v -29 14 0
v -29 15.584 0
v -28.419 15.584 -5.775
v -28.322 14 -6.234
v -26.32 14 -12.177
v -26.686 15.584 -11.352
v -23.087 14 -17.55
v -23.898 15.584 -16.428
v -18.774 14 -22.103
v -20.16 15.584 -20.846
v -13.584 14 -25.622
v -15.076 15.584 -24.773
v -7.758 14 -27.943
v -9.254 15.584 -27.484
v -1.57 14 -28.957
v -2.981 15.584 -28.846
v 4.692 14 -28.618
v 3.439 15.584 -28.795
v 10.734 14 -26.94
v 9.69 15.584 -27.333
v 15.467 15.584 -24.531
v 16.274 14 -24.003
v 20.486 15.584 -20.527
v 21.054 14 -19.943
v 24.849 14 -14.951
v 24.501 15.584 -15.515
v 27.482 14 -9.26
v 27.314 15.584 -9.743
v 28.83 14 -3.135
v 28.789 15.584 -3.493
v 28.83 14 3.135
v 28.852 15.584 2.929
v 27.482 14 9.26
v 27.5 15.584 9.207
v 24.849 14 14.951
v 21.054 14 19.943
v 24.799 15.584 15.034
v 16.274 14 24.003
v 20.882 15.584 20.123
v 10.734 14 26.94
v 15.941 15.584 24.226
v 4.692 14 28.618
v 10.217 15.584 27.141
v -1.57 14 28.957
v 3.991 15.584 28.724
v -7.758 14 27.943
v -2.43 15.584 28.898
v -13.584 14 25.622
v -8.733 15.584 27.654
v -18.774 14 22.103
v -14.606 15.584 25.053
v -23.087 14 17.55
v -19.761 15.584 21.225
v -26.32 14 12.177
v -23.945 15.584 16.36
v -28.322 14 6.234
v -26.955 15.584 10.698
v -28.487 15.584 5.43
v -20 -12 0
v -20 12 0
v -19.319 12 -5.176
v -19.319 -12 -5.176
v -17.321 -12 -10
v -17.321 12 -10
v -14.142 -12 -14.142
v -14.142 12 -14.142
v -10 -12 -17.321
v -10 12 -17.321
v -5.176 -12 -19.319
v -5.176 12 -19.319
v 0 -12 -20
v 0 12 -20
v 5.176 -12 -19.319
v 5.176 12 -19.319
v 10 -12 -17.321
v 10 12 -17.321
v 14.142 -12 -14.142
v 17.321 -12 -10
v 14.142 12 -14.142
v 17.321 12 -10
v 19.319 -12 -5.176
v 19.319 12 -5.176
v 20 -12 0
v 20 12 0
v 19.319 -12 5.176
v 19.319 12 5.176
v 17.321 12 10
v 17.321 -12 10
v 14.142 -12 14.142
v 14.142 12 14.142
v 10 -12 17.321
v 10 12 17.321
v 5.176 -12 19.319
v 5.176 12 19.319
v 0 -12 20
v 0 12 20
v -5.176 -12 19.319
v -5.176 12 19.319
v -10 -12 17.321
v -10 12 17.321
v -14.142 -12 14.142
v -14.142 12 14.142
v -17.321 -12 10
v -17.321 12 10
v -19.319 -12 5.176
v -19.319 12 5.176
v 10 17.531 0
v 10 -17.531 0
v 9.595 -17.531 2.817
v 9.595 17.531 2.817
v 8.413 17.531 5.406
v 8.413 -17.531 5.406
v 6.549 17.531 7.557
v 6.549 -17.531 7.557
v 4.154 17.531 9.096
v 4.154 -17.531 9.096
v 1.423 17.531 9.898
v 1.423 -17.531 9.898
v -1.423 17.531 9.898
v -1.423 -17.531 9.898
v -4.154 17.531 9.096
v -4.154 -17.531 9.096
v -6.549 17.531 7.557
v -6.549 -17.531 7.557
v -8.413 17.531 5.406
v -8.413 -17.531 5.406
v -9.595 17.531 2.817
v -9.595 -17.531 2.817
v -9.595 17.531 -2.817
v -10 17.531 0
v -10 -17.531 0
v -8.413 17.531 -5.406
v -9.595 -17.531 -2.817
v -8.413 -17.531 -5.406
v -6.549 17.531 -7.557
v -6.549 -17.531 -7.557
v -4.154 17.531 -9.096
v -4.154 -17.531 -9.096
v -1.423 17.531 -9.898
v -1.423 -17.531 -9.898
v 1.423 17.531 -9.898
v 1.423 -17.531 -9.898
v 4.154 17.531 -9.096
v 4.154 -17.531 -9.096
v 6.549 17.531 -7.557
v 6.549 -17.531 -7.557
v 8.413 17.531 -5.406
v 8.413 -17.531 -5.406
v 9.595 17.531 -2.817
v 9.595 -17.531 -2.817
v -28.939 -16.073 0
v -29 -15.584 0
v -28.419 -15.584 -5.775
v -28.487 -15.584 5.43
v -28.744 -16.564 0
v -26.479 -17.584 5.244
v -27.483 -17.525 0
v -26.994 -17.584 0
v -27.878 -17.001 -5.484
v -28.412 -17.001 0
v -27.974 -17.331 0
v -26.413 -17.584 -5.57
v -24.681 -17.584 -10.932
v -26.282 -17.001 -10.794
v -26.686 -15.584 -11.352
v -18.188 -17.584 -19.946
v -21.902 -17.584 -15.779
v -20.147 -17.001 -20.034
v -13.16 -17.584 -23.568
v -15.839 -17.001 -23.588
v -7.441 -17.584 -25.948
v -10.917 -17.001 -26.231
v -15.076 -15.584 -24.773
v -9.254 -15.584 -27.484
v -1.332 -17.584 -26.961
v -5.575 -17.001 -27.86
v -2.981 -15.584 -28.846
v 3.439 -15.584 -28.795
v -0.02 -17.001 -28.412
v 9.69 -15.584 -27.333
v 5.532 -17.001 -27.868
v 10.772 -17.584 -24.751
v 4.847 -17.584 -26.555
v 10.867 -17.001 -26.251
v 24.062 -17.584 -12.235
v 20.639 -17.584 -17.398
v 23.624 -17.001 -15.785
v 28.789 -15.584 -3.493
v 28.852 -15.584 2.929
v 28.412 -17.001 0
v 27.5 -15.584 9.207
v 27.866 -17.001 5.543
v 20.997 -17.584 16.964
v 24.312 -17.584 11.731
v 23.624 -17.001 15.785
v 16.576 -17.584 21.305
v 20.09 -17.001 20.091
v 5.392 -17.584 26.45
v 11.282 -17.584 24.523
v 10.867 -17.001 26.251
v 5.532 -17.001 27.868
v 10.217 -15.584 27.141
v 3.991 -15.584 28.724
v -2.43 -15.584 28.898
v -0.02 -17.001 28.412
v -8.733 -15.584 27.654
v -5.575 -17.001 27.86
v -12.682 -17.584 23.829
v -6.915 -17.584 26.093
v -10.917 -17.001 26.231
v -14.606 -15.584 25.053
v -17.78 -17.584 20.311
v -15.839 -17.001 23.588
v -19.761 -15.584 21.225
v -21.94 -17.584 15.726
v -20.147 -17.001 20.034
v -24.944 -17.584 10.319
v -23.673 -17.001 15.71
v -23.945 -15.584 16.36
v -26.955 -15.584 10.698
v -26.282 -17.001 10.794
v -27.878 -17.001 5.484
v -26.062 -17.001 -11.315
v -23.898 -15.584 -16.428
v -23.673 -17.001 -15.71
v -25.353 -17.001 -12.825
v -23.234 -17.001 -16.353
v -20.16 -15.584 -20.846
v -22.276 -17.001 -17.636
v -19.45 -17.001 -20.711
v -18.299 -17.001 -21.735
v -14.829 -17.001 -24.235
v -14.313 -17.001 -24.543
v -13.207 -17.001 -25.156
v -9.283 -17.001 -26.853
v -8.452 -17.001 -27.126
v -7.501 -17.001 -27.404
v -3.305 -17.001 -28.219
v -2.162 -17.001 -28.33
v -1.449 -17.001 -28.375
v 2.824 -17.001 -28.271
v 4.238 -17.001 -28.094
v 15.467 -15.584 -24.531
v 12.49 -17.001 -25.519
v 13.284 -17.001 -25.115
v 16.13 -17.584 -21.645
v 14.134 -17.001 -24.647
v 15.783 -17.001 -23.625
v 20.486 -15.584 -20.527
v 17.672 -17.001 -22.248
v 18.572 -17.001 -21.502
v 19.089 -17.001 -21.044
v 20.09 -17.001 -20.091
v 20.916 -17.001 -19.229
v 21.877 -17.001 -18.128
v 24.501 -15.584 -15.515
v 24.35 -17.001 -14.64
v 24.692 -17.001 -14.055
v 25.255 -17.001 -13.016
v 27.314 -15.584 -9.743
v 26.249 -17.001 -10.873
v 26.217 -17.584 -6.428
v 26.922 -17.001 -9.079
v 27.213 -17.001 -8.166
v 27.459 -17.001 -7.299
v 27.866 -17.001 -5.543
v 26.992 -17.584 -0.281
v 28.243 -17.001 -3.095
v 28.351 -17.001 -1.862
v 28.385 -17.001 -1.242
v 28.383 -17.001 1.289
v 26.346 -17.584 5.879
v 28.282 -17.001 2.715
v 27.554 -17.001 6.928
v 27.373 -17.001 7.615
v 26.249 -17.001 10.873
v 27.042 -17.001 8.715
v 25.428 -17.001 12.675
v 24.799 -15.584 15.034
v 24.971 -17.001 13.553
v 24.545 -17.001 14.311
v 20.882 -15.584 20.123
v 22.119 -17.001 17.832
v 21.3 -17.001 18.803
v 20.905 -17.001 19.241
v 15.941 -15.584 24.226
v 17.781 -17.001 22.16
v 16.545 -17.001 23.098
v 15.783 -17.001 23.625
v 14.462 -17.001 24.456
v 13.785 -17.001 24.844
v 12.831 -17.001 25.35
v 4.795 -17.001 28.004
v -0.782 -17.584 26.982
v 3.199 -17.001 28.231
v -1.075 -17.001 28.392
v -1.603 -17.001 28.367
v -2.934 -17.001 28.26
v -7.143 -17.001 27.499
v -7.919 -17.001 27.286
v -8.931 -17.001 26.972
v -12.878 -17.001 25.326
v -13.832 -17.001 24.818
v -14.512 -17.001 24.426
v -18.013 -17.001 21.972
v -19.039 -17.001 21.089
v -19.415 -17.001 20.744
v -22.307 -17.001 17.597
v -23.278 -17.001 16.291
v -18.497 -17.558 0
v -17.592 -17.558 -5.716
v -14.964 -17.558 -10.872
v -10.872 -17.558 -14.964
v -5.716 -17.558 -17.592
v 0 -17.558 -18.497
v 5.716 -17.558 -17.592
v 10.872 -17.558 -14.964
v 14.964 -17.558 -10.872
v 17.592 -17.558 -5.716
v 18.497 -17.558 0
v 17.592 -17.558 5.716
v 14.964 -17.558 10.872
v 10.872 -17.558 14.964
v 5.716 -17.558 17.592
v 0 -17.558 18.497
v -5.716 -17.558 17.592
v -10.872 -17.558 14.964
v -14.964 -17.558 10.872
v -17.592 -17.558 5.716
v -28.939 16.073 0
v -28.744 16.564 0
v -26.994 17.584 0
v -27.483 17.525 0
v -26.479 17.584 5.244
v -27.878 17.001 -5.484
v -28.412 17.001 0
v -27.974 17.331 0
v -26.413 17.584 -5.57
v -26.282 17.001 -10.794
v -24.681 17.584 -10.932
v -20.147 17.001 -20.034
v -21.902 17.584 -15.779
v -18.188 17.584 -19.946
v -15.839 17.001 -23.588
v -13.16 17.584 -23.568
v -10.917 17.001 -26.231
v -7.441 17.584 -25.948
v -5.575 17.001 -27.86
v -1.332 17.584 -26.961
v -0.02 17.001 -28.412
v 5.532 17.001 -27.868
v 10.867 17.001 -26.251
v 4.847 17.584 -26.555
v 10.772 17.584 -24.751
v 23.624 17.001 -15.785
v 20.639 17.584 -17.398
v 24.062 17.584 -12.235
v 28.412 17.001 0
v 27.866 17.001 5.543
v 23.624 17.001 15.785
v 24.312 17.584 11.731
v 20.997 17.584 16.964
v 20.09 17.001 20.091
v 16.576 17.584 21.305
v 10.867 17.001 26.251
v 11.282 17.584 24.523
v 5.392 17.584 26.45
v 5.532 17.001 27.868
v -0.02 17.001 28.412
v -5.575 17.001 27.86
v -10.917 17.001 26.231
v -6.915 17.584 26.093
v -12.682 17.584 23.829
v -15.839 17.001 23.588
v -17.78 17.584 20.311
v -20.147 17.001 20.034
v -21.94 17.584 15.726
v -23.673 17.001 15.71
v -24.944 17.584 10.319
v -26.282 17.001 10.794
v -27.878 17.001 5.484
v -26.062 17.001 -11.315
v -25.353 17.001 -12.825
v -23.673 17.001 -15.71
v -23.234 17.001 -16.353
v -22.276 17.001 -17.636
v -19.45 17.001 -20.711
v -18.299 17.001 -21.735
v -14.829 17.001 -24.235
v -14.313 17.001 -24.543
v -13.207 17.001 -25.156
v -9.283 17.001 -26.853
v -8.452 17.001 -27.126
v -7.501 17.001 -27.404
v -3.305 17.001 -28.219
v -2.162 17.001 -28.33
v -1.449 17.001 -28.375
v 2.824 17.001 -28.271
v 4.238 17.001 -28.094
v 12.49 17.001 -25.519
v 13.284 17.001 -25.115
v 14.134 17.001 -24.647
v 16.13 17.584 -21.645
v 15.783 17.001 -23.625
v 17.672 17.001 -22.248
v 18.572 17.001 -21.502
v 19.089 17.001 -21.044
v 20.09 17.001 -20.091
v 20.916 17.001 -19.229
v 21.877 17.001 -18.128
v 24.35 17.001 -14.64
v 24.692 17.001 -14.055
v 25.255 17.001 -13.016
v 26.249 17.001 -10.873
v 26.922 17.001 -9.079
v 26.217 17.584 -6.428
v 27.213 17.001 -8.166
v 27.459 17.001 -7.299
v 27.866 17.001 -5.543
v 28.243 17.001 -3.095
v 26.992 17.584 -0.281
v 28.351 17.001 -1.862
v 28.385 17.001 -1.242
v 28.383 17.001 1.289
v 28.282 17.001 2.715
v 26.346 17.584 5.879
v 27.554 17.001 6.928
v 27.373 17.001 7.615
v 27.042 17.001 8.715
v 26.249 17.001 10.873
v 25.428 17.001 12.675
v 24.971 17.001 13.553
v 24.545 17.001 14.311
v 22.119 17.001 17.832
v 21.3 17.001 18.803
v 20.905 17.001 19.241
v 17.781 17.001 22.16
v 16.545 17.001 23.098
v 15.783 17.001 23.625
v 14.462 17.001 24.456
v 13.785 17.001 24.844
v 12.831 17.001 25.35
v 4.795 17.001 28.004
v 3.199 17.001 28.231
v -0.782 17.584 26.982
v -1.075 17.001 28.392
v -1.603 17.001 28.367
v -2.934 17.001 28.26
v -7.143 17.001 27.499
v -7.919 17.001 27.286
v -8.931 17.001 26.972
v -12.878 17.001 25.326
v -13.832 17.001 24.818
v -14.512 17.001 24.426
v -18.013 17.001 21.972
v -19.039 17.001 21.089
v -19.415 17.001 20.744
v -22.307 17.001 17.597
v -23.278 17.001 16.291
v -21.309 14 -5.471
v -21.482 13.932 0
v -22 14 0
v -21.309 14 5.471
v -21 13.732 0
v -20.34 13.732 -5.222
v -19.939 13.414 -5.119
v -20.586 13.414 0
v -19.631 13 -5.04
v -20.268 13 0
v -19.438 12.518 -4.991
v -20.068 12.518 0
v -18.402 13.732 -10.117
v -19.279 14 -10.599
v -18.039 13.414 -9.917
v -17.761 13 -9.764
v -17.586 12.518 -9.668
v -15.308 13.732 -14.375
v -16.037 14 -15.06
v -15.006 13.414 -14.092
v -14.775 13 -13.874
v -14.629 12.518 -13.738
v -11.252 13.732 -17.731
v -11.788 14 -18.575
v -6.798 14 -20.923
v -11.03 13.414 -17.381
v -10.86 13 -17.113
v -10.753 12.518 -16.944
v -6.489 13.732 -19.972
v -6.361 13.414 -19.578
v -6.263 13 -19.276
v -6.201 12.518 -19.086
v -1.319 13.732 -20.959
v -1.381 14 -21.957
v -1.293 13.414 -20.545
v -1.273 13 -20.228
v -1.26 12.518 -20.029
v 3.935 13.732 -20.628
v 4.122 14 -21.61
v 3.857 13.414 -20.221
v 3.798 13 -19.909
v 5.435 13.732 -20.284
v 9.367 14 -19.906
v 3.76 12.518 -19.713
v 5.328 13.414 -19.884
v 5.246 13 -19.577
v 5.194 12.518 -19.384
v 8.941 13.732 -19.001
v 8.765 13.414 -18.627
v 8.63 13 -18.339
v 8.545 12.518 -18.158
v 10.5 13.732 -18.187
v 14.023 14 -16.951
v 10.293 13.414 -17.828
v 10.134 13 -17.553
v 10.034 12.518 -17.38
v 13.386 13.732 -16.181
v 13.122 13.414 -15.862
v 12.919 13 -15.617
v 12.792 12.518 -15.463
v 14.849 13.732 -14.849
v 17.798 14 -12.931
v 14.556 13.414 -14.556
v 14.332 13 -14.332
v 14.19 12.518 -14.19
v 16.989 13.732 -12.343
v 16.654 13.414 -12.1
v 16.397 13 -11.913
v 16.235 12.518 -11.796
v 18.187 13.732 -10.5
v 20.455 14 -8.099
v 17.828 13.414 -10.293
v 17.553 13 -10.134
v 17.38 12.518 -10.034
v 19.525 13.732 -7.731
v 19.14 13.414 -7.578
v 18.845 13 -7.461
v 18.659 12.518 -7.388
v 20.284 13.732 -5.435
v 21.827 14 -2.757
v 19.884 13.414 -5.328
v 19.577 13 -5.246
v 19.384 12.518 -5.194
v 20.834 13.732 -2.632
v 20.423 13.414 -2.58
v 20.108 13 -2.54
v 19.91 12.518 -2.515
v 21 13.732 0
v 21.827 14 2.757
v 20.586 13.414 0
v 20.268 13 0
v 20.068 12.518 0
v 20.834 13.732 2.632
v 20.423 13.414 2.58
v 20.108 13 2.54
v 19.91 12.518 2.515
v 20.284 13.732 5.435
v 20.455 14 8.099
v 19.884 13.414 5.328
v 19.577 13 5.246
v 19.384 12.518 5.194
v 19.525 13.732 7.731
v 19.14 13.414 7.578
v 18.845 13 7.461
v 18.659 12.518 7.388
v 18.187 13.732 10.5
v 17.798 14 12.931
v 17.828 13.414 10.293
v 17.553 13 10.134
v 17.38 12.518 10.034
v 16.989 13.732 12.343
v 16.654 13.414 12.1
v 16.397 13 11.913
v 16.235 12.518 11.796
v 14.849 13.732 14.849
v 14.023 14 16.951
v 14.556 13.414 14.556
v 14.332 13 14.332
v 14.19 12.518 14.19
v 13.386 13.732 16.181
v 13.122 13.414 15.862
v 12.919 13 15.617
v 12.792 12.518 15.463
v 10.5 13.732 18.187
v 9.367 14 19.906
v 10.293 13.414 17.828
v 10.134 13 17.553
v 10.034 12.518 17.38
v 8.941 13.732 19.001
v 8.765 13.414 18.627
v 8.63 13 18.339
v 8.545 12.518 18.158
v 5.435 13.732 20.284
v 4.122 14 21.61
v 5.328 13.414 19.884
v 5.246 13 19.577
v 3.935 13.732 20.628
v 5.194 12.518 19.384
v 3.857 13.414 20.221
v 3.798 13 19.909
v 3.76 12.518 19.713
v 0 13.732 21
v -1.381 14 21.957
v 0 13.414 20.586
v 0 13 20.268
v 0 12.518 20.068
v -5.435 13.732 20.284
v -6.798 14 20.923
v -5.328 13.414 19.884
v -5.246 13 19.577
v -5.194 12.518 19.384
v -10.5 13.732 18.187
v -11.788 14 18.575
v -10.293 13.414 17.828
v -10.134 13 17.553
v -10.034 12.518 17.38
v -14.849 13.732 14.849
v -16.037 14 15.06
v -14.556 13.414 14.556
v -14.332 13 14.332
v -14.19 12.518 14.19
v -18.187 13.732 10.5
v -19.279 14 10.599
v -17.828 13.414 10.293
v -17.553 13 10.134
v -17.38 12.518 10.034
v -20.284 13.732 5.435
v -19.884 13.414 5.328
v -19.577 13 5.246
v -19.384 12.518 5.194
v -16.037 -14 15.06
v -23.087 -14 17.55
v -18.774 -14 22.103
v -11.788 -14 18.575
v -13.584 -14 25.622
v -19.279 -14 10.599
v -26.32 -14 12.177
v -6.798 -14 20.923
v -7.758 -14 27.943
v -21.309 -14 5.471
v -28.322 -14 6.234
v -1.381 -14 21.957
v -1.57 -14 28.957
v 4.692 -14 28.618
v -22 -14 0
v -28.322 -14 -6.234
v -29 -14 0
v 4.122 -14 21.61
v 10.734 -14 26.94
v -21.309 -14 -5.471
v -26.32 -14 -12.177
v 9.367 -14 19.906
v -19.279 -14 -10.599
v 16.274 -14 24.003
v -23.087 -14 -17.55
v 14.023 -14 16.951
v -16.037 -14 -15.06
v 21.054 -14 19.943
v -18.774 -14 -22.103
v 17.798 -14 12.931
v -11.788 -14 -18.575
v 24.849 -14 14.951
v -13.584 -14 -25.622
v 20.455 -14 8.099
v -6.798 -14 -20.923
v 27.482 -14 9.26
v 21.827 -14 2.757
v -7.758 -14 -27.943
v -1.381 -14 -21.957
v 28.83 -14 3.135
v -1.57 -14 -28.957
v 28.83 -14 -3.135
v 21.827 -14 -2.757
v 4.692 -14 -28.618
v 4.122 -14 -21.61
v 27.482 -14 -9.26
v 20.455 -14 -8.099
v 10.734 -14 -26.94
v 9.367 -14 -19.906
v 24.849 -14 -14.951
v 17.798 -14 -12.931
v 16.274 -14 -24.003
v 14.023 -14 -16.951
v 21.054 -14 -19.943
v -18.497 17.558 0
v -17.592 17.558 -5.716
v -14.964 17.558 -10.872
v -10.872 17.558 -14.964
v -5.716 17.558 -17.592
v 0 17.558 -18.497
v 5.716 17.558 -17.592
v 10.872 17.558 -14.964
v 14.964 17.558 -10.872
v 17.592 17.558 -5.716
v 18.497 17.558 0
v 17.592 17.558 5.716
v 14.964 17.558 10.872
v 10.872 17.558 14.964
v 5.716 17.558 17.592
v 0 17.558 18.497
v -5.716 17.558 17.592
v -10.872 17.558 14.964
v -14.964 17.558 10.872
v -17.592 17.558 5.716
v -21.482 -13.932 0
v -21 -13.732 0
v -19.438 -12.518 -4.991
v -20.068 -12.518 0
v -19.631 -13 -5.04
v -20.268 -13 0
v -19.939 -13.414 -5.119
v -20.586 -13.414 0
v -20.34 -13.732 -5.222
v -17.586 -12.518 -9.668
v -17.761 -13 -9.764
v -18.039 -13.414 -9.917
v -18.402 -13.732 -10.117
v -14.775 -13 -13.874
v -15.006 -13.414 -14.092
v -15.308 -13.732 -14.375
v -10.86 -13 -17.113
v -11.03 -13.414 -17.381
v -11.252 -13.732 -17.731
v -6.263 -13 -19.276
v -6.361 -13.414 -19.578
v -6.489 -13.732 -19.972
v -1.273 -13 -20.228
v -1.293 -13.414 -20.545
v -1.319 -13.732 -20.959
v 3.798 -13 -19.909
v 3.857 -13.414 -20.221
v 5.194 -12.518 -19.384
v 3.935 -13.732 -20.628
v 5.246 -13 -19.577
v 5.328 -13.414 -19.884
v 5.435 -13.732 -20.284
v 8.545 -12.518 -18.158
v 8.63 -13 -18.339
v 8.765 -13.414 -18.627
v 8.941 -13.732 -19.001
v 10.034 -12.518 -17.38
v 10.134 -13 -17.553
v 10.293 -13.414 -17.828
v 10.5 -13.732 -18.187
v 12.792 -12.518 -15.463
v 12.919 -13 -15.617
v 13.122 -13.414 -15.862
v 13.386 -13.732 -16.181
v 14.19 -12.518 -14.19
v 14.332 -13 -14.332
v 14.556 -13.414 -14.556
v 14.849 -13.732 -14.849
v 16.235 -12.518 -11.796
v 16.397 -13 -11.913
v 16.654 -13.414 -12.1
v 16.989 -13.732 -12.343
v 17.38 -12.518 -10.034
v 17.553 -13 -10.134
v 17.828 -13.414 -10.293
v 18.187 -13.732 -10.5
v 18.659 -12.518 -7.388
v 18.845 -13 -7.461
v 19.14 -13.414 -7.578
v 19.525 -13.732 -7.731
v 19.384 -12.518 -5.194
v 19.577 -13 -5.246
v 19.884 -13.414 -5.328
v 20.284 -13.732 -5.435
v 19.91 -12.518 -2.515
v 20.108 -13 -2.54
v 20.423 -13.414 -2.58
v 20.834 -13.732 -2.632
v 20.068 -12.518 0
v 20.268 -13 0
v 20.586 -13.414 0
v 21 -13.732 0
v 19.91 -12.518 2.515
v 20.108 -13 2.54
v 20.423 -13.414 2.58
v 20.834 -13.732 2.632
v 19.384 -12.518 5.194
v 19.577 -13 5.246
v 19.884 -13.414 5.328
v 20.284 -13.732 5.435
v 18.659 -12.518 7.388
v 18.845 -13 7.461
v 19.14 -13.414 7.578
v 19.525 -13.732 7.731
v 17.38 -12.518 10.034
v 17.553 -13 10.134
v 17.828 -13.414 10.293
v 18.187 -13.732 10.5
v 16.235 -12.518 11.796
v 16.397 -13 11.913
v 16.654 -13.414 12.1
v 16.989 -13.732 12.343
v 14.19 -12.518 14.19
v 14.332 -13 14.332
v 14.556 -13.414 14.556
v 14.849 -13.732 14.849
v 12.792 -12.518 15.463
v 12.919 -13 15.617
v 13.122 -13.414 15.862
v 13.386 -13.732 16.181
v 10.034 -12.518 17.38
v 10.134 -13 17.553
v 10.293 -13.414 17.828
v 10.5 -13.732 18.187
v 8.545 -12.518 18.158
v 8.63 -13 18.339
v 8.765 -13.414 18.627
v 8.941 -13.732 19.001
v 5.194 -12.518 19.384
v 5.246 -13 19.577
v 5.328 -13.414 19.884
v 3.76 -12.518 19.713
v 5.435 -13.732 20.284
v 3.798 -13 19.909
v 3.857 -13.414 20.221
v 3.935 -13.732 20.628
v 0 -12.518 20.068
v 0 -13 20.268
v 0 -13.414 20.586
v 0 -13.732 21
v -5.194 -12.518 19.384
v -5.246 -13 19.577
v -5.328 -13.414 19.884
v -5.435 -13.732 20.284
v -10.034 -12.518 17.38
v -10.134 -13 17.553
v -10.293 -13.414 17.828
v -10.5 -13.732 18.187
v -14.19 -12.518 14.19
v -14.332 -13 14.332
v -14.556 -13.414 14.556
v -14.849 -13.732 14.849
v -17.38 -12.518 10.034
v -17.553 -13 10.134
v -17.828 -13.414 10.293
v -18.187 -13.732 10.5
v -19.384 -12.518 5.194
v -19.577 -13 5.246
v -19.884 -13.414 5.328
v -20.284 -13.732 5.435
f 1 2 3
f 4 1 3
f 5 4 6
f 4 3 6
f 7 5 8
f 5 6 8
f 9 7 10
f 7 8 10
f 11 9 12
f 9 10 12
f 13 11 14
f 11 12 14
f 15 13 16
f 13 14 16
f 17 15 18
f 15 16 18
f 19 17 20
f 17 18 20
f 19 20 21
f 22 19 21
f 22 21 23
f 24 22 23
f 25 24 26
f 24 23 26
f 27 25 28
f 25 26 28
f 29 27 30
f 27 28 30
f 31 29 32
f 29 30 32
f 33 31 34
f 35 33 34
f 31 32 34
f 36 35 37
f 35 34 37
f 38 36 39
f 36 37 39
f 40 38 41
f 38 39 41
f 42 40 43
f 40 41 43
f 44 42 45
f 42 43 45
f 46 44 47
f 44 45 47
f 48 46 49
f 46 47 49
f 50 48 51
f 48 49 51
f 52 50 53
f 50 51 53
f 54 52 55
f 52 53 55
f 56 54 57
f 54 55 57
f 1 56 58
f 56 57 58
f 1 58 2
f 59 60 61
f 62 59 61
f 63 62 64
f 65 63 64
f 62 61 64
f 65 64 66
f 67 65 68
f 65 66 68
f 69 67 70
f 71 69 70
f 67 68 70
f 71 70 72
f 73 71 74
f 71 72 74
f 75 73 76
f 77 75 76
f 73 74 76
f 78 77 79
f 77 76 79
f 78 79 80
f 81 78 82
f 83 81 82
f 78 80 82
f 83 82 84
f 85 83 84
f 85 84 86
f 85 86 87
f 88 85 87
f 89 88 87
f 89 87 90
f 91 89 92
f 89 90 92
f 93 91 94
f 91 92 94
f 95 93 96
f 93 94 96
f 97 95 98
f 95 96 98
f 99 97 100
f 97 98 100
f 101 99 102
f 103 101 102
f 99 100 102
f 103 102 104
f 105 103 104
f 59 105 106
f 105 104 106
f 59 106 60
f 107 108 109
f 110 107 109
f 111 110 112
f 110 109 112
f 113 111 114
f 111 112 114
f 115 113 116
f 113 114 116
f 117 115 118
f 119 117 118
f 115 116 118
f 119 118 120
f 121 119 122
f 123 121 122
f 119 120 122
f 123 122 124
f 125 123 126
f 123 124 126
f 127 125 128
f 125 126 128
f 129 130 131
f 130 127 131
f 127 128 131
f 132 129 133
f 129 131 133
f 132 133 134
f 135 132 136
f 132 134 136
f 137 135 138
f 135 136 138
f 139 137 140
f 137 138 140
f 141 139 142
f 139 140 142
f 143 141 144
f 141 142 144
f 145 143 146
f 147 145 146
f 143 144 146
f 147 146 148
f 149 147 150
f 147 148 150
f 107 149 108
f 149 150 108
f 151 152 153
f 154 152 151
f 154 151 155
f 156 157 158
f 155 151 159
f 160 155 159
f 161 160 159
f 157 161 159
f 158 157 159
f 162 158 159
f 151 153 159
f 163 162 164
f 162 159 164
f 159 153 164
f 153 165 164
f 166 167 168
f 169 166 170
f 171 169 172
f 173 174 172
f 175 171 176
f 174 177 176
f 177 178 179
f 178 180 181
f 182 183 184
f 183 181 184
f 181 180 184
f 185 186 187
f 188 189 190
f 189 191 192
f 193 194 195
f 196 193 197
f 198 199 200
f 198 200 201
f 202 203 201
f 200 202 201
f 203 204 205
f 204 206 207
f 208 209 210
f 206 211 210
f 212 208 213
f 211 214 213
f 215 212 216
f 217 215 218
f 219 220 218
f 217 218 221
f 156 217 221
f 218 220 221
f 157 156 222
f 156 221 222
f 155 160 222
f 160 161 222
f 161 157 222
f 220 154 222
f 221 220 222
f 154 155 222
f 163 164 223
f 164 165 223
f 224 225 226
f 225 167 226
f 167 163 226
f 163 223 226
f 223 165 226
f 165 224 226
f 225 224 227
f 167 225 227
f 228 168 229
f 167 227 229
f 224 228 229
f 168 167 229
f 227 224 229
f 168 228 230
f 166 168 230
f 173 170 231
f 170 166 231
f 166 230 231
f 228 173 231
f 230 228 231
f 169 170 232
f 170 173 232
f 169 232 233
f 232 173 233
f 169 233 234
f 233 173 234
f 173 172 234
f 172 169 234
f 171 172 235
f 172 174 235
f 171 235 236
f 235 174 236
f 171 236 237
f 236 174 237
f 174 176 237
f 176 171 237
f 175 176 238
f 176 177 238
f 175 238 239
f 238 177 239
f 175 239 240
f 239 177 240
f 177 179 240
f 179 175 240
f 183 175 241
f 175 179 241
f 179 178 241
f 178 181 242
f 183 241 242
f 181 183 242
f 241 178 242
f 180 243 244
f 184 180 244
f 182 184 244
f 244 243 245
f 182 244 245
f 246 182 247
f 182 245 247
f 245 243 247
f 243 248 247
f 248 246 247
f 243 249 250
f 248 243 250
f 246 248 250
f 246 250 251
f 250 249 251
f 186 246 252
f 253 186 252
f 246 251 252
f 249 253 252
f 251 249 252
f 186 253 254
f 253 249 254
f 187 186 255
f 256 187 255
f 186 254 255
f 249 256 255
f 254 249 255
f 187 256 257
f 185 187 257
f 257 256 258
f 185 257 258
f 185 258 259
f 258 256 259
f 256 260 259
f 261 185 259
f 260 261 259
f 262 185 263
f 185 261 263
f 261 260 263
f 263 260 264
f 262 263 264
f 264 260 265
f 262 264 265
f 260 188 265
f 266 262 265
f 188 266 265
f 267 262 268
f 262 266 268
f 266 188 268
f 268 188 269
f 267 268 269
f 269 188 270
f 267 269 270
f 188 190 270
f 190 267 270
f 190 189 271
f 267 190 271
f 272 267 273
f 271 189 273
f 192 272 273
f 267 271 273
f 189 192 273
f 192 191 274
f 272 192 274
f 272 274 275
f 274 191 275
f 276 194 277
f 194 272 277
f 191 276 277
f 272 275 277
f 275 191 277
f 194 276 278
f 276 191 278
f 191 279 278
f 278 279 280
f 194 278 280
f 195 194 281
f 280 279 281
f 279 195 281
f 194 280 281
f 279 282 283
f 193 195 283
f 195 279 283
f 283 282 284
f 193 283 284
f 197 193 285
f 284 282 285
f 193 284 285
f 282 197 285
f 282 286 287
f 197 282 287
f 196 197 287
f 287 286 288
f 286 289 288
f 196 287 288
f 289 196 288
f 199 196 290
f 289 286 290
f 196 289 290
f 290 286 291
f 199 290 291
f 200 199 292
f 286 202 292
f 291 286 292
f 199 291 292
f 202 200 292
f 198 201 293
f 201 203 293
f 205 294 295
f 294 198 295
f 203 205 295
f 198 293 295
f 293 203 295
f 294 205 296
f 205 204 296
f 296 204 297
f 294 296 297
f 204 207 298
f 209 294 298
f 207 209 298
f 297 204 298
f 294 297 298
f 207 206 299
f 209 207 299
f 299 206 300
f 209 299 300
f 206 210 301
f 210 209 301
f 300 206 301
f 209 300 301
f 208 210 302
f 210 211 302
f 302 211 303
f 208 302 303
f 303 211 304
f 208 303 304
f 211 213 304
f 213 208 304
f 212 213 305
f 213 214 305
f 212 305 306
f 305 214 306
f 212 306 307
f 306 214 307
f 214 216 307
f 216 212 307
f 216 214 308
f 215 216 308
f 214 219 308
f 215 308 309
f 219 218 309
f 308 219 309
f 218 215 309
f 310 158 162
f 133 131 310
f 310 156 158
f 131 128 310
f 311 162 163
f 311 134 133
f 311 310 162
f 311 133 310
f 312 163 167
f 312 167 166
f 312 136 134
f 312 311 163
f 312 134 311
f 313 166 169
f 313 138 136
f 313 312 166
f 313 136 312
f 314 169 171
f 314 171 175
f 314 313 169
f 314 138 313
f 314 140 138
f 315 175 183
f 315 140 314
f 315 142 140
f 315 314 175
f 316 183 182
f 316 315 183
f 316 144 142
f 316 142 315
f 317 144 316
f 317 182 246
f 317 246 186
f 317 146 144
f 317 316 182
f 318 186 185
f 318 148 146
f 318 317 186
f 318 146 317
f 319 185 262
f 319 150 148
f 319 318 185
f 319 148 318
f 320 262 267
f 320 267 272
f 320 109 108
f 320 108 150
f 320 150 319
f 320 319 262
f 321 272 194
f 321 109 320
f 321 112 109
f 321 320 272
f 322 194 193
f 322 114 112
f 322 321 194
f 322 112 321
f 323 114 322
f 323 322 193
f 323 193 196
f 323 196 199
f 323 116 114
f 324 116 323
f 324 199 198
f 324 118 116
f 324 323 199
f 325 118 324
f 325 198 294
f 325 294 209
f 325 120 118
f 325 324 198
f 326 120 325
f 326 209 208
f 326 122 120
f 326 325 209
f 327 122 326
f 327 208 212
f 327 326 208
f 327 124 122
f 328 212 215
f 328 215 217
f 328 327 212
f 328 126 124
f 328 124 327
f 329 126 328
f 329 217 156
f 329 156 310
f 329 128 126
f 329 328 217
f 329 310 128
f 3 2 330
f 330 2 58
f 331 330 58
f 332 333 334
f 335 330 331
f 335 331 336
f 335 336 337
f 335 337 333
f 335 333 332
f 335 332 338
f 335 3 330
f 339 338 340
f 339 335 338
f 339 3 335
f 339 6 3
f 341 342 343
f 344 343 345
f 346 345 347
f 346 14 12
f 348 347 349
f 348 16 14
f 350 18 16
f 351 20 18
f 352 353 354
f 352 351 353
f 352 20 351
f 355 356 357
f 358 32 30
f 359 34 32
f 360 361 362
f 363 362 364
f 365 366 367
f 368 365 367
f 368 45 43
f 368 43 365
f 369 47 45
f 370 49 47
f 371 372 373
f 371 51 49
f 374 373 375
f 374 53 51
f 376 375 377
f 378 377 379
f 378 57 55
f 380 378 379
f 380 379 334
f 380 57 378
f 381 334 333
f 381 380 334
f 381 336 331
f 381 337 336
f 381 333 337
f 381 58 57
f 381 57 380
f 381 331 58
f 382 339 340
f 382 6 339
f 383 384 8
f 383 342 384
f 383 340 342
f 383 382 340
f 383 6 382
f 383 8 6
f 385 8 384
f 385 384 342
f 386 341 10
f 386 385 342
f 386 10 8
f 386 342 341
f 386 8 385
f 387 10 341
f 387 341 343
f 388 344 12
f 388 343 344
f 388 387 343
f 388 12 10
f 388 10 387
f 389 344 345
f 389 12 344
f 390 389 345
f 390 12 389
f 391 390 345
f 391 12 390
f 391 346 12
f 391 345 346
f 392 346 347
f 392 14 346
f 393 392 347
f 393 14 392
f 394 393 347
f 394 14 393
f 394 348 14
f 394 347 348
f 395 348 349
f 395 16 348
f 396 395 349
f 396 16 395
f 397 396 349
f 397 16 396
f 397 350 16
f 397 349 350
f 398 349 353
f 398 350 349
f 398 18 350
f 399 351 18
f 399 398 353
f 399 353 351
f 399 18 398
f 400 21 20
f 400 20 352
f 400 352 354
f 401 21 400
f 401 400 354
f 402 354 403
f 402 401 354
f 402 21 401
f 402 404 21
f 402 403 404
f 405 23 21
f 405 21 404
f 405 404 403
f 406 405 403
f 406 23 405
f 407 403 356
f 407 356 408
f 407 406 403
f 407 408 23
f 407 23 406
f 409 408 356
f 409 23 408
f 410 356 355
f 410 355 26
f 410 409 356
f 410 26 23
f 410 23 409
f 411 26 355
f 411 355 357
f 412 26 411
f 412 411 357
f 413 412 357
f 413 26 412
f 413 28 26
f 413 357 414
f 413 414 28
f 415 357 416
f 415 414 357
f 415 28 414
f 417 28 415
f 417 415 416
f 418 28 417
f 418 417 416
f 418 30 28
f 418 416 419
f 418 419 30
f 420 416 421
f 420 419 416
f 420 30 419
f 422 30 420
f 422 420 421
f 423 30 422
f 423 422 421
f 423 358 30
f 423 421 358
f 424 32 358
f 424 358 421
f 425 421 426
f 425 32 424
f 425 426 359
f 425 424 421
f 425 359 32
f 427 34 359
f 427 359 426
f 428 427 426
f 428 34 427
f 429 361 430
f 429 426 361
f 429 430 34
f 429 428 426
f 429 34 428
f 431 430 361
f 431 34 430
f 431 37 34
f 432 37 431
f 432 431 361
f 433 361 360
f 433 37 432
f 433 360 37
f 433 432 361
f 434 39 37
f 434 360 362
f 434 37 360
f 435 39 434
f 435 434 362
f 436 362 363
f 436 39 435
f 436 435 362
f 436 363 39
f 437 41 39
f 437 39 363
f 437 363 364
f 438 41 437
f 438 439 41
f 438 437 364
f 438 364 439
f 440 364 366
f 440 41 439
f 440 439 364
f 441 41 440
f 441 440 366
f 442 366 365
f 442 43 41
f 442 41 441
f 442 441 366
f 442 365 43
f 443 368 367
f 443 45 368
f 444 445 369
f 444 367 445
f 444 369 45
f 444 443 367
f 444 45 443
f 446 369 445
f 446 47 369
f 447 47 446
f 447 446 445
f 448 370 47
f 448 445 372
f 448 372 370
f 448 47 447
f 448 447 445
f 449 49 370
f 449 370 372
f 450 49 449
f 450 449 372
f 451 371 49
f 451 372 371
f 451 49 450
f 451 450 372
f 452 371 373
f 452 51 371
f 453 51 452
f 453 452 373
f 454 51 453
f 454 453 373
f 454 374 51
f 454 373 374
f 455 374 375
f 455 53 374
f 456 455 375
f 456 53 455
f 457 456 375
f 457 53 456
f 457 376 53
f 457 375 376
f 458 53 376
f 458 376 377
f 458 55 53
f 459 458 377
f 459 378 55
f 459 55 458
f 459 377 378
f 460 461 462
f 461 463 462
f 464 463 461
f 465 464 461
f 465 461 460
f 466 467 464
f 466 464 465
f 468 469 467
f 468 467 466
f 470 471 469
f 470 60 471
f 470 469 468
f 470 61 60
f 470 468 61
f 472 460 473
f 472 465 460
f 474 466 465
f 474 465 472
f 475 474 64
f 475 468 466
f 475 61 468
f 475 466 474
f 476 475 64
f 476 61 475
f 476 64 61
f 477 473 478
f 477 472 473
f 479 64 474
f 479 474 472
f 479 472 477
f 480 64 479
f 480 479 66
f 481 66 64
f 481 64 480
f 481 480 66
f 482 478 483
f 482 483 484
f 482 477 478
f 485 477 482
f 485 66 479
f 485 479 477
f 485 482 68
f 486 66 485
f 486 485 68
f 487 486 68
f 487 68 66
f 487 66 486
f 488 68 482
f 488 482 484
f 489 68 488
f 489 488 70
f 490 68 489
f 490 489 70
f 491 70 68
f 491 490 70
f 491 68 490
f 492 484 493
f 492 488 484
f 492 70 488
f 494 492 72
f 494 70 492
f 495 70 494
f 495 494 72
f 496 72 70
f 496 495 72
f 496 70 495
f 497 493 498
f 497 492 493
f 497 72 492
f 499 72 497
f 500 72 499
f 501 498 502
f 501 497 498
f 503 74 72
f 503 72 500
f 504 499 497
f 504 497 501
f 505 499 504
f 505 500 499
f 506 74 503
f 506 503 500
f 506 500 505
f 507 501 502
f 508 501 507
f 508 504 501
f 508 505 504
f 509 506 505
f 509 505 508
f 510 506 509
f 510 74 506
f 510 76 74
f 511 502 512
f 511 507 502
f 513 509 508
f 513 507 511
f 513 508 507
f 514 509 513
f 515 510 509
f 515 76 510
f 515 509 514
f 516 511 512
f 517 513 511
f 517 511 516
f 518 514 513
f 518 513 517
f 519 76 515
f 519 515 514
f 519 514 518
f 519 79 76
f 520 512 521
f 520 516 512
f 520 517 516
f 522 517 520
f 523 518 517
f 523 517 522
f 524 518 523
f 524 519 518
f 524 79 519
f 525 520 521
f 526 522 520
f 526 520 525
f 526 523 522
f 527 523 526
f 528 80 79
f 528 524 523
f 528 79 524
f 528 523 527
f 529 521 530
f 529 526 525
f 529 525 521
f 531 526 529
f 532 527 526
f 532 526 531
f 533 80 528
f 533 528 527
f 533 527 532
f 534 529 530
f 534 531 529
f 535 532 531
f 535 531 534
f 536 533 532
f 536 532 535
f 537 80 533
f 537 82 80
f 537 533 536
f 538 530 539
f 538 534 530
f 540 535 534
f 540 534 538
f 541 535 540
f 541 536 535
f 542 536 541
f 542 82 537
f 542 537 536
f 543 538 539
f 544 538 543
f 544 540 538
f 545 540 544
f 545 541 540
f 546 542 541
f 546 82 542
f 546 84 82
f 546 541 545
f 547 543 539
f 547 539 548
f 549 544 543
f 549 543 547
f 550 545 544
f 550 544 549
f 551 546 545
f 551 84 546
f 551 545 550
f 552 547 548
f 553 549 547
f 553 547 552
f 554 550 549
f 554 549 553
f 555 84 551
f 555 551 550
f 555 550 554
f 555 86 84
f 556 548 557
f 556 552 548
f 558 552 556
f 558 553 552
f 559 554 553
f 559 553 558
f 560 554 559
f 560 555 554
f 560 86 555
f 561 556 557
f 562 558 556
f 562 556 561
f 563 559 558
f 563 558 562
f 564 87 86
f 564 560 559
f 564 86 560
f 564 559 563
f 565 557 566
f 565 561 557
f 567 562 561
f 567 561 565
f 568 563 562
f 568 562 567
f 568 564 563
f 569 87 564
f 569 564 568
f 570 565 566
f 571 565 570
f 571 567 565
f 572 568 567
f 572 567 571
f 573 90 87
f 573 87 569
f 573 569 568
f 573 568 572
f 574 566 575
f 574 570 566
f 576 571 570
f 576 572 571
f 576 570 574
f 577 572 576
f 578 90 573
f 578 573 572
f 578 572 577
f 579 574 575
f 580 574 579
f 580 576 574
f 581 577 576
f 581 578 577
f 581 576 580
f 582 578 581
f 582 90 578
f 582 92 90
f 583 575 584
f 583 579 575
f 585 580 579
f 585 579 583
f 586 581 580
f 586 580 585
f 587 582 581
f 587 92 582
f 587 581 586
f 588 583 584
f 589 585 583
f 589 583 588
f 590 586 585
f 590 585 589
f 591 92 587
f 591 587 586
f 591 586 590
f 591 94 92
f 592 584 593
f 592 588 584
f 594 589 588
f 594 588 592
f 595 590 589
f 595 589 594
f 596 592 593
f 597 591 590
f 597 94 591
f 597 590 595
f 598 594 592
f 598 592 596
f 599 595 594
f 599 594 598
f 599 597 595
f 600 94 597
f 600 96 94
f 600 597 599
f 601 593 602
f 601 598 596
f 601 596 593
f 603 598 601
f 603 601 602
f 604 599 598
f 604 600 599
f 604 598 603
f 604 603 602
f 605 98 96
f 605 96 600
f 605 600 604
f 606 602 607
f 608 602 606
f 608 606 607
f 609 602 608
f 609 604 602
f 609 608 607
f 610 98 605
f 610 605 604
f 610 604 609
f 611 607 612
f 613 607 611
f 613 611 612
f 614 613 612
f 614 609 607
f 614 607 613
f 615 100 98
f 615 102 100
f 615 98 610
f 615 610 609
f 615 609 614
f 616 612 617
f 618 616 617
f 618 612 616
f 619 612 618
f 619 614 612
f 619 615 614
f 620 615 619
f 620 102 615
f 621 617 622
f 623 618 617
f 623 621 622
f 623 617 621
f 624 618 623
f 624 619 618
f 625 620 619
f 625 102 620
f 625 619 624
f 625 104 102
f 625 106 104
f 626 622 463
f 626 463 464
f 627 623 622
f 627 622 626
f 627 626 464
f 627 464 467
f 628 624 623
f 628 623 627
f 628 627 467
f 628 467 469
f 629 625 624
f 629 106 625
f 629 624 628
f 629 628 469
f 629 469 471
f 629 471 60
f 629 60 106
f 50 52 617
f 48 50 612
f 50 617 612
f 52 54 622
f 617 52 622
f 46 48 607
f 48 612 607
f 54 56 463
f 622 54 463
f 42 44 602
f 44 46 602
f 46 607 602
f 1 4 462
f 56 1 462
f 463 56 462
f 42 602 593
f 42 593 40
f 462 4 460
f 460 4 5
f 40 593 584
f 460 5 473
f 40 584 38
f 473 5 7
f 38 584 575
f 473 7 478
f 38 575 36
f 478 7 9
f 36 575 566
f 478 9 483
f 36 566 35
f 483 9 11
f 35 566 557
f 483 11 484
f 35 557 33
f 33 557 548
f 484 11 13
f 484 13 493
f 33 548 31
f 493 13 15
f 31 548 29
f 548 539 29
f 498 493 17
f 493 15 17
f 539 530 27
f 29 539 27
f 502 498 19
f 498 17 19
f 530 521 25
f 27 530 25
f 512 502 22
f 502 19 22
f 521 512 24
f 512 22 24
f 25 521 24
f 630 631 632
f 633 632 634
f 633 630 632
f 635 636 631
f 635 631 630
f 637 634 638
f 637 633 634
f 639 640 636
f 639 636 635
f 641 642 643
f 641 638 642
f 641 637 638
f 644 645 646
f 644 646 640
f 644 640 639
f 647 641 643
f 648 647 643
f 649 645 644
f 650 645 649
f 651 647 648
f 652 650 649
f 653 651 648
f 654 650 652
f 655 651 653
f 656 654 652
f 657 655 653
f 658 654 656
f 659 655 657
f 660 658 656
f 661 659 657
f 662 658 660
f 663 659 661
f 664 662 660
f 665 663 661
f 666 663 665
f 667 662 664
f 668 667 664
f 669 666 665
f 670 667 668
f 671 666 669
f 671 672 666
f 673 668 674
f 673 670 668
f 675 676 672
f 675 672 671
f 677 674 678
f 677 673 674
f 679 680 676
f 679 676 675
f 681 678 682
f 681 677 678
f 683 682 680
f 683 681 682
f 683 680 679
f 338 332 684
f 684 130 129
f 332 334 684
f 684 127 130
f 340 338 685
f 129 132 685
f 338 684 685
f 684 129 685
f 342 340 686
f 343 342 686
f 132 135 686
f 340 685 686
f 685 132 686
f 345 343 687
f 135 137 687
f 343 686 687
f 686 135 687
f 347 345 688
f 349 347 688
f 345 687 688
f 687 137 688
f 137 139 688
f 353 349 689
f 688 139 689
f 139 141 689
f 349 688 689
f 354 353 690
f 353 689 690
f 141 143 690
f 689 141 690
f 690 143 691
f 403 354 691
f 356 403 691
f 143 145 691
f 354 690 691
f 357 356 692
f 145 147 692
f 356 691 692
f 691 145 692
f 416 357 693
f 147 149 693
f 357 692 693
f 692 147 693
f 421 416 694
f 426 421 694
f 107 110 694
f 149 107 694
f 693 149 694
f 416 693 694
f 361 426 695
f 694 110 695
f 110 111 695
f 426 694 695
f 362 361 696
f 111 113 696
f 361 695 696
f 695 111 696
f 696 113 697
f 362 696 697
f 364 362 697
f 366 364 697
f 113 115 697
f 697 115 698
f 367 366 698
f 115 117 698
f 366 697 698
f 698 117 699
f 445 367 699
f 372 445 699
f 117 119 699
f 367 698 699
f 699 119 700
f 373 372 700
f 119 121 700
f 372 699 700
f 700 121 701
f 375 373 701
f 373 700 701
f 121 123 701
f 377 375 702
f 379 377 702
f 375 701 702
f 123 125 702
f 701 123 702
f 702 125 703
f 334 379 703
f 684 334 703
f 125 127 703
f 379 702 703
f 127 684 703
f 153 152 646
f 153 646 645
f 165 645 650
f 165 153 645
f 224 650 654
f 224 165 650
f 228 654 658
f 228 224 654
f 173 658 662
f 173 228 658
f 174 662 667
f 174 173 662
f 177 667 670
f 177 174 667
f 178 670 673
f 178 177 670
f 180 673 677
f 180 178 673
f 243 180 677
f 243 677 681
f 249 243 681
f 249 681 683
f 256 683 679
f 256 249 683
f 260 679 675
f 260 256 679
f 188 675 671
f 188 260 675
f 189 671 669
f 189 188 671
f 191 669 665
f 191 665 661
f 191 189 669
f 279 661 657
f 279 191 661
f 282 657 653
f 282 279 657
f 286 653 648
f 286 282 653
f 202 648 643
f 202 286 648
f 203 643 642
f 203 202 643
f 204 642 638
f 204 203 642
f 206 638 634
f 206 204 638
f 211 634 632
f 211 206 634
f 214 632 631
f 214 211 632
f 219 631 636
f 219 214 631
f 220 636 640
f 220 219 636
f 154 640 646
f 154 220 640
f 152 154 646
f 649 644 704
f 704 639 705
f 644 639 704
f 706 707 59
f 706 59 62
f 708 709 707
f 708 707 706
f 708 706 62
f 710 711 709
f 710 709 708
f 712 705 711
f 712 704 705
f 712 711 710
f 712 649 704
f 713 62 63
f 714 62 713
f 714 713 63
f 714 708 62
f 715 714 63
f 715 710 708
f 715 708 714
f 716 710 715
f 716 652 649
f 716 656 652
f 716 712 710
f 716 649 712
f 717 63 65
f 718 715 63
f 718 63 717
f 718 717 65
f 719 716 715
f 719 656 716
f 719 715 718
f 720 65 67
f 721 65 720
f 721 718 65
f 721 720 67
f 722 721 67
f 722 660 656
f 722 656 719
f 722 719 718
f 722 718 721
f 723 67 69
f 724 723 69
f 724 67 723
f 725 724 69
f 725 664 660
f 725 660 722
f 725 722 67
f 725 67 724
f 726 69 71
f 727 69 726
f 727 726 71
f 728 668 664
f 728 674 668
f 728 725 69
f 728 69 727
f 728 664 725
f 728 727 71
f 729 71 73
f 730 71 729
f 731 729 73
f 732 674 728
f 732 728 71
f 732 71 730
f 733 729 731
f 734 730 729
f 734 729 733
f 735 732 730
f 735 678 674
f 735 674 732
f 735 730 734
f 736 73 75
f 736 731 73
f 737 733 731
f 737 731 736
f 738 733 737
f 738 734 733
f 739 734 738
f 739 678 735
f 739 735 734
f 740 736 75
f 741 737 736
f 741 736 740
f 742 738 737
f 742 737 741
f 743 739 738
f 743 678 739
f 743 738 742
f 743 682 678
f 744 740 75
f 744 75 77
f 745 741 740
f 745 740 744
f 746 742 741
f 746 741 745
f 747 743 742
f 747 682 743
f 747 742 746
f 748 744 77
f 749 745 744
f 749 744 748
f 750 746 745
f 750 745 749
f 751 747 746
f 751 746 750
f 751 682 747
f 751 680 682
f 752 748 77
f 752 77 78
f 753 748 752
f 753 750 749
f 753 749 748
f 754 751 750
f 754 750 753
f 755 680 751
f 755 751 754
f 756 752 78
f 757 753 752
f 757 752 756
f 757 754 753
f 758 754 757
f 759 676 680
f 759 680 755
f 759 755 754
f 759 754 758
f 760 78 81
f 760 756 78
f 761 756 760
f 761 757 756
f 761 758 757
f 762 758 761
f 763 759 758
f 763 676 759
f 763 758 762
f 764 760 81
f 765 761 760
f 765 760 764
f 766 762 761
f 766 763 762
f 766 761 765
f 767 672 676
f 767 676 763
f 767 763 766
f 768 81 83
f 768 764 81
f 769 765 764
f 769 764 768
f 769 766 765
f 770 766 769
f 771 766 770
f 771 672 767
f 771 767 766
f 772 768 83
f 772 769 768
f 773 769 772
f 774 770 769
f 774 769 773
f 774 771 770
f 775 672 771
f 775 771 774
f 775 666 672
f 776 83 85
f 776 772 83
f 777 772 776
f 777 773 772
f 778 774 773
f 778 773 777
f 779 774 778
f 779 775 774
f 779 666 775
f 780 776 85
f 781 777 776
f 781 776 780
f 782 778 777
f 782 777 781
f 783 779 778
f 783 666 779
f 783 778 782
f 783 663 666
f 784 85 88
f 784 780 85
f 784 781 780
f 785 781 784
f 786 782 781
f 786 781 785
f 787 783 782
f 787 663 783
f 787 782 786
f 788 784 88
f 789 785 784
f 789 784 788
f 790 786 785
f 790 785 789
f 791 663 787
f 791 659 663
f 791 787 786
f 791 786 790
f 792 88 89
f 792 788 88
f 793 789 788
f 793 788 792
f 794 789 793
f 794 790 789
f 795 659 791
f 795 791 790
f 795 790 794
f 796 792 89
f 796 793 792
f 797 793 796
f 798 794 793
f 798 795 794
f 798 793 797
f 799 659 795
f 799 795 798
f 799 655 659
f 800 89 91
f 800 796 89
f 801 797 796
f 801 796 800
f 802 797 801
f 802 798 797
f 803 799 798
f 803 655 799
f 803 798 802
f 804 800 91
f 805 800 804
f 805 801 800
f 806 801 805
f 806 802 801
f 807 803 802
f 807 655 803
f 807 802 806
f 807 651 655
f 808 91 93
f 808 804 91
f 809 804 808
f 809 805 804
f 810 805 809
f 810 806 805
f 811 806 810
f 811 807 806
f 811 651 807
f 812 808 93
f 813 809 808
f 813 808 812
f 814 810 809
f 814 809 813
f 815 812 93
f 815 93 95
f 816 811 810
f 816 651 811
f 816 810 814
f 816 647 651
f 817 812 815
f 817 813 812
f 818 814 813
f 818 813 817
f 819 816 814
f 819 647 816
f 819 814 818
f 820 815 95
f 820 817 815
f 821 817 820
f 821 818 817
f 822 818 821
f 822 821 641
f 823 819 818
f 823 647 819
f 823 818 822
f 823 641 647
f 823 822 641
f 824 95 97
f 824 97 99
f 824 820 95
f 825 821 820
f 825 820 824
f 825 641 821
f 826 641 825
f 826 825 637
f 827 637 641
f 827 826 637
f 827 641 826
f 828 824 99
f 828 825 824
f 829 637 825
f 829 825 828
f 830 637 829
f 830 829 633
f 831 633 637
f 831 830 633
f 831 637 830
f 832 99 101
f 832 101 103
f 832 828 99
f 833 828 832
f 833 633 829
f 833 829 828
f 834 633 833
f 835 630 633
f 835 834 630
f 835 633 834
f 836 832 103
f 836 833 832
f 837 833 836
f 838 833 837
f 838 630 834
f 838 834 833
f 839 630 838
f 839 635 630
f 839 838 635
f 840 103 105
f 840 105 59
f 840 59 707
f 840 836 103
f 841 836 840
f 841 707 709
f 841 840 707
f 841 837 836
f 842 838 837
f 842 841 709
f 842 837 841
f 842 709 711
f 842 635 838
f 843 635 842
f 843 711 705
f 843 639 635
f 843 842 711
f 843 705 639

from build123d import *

# Parameters (mm, degrees)
F3_R     = 2
F4_R     = 2
F5_R     = 10
F6_DEPTH = 20


with BuildPart() as f1:
    # F0 (on Top) → F1 (revolve)
    with BuildSketch(Plane.XY):
        Polygon((-20, -14), (-29, -14), (-29, -17.5904668427), (0, -17.5), (0, 0), (-20, 0), align=None)
    revolve(axis=Axis((0, -8.75, 0), (0, -1, 0)))

    # F2: F1 across plane


with BuildPart() as f1_1:
    add(f1.part)
    add(f1.part.mirror(Plane.XZ))

    # F3
    f3_edges = [f1_1.edges().sort_by_distance(p)[0] for p in [
        (20, 14, 0),
    ]]
    fillet(f3_edges, radius=F3_R)

    # F4
    f4_edges = [f1_1.edges().sort_by_distance(p)[0] for p in [
        (20, -14, 0),
        (29, -17.590467, 0),
        (29, 17.590467, 0),
    ]]
    fillet(f4_edges, radius=F4_R)

    # F5 (on Front) → F6 (cut, symmetric)
    with BuildSketch(Plane.XZ):
        Circle(F5_R)
    extrude(amount=F6_DEPTH, both=True, mode=Mode.SUBTRACT)


solid = f1_1.part
